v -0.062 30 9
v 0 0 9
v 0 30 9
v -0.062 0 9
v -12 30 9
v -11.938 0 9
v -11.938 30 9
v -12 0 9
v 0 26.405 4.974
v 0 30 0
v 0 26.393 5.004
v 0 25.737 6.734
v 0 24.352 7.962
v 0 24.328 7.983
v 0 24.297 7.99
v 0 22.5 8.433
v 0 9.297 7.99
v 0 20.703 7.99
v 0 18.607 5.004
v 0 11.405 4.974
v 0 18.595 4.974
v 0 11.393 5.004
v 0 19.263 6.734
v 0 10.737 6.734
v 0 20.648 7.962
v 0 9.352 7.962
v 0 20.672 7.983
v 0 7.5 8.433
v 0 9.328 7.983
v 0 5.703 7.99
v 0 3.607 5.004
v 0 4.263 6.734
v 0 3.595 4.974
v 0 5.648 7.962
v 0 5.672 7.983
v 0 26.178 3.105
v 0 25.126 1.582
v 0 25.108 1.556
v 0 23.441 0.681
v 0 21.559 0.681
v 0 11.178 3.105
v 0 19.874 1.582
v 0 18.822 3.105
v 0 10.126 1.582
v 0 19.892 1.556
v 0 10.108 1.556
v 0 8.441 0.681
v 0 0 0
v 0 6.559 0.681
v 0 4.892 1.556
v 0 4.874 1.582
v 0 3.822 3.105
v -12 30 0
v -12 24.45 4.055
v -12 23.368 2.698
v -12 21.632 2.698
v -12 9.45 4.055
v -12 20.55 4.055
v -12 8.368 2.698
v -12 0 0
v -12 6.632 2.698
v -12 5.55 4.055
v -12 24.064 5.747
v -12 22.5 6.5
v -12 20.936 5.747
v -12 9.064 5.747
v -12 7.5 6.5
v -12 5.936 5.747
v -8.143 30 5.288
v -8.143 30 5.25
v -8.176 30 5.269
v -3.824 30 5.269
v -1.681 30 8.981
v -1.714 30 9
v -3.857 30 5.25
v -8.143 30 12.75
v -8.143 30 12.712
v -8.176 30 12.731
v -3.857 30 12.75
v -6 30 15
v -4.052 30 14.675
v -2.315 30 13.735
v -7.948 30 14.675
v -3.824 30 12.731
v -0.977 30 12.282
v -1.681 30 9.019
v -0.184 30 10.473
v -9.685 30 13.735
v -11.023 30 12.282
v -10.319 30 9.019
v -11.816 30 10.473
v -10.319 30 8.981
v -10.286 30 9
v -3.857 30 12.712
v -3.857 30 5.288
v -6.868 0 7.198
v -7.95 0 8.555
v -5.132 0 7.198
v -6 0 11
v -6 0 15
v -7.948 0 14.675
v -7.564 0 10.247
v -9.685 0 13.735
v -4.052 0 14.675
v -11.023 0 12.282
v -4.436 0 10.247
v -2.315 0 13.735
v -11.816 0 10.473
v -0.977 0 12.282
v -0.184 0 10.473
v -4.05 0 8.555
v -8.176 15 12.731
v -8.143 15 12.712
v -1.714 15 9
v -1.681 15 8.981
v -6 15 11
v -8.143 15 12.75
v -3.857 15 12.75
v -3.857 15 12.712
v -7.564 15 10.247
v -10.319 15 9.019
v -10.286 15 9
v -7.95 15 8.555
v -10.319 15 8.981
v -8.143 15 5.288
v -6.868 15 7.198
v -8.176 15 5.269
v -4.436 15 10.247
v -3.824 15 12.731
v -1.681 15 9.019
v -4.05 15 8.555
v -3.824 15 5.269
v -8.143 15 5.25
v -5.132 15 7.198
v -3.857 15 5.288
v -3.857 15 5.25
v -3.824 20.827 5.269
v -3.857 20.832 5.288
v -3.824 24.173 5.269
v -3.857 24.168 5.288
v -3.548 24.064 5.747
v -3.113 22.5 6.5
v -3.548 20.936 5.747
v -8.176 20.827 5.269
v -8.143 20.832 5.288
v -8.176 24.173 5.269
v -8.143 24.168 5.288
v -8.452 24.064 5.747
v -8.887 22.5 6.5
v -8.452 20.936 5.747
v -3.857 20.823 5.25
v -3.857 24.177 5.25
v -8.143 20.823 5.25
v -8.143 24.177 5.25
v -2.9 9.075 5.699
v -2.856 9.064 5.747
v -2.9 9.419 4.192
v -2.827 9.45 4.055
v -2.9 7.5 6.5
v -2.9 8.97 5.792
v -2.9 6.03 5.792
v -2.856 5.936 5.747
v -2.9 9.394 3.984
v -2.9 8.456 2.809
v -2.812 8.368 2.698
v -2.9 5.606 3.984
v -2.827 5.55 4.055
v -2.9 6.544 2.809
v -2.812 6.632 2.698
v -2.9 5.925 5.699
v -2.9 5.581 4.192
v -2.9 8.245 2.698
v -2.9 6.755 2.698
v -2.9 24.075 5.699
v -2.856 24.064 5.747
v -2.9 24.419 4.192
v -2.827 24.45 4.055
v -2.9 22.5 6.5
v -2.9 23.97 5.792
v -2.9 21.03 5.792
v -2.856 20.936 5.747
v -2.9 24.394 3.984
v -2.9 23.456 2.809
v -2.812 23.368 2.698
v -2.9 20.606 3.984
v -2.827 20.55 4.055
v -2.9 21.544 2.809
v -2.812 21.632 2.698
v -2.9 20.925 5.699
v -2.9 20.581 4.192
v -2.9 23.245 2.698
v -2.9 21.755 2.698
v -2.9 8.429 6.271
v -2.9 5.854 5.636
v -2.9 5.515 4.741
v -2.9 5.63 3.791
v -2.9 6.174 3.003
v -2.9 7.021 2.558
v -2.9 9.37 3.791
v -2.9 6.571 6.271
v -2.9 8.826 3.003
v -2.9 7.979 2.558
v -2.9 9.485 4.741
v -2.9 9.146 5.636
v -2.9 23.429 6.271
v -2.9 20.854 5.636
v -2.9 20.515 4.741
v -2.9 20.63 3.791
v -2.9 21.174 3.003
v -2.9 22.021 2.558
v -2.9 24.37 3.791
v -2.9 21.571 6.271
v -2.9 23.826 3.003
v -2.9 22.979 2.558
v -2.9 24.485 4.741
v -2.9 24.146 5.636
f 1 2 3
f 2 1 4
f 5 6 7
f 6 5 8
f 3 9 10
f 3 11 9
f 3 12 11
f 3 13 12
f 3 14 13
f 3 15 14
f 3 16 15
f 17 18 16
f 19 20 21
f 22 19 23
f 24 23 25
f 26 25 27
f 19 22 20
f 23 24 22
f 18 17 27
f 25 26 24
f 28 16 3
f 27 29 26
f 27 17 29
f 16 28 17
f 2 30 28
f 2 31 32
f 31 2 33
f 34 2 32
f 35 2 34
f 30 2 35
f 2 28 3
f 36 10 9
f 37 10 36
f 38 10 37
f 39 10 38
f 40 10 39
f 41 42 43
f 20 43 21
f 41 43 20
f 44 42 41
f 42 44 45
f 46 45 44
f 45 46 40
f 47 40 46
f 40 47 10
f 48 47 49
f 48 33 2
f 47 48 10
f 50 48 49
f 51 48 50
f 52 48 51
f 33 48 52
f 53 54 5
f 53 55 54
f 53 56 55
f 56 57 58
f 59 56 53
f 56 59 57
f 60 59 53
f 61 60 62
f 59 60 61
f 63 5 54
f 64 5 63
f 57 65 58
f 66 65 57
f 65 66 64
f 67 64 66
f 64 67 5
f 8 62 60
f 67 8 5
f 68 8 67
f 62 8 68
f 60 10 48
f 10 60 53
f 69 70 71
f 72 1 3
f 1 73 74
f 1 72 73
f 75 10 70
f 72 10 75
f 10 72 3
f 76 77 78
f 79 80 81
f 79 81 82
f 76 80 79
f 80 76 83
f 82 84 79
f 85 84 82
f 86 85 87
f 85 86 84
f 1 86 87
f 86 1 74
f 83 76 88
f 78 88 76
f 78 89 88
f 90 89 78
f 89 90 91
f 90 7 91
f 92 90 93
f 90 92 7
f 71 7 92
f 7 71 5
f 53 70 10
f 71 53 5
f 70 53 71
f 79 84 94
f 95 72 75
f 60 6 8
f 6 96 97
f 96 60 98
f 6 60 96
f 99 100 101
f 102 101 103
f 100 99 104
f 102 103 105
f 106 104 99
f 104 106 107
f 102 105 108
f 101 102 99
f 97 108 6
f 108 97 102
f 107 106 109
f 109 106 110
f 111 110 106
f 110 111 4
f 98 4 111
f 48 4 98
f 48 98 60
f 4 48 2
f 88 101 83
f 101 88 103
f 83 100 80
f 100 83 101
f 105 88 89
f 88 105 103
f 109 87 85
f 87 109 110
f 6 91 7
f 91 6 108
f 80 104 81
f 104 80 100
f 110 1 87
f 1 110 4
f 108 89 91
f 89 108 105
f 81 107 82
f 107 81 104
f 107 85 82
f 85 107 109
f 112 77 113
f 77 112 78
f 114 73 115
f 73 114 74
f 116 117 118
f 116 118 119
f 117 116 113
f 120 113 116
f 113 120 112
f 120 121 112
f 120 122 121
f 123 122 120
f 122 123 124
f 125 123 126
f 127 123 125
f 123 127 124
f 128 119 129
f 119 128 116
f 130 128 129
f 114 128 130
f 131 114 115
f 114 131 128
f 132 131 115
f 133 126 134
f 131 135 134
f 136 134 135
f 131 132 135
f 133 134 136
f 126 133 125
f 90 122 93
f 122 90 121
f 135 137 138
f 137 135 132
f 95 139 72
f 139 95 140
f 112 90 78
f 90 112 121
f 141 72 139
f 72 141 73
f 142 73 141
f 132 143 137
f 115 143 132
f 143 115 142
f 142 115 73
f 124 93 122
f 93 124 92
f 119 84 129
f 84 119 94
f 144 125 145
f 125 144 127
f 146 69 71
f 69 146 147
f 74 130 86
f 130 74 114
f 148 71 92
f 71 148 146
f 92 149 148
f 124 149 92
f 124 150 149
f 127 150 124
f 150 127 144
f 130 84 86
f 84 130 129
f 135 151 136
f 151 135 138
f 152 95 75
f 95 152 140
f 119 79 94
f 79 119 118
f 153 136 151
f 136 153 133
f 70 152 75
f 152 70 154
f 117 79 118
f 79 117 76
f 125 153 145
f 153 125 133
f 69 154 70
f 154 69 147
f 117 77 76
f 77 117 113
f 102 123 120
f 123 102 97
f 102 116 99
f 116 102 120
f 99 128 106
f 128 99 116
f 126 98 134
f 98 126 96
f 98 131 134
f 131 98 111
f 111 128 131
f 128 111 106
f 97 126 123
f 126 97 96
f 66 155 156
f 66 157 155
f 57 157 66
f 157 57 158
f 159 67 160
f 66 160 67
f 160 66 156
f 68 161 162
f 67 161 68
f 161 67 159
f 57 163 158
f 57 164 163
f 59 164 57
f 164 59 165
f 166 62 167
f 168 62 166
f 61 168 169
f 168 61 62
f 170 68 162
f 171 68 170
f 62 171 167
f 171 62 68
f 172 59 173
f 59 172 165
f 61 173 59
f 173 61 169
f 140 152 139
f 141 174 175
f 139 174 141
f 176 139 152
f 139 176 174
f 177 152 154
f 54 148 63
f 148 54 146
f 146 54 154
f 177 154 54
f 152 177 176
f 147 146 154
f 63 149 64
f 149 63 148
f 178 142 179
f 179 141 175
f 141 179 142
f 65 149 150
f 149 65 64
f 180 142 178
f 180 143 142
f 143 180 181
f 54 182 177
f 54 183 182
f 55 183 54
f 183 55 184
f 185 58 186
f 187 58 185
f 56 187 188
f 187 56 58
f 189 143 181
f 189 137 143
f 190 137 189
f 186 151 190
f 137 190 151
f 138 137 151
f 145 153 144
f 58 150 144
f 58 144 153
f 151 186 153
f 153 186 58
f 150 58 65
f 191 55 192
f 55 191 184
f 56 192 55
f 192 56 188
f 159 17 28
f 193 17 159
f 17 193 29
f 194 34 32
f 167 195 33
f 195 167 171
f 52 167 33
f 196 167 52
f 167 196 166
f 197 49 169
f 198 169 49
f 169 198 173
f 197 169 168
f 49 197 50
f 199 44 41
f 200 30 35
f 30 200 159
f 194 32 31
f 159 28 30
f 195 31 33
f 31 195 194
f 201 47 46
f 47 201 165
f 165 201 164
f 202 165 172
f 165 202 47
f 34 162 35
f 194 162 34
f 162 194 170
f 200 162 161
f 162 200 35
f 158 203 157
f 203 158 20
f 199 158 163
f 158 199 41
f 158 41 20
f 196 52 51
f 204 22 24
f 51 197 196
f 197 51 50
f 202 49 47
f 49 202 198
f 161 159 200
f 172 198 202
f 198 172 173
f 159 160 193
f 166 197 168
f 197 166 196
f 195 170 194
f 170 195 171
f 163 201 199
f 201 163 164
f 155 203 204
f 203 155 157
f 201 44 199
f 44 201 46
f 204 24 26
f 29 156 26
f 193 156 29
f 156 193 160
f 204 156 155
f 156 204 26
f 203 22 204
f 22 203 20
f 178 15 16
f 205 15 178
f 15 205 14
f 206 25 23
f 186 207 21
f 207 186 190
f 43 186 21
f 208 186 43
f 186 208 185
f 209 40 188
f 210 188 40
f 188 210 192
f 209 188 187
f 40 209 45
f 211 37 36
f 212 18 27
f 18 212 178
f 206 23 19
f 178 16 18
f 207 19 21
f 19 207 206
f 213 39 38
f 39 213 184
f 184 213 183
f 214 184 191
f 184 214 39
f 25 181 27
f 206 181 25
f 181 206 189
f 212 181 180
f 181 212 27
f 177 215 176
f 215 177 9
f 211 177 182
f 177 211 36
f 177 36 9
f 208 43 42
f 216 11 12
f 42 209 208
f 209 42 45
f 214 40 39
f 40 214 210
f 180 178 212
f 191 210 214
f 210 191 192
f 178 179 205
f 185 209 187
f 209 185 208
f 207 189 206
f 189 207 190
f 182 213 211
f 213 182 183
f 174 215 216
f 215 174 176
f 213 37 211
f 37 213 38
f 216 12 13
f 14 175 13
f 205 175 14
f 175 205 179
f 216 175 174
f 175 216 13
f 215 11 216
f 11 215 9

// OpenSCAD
wood_thickness = 9;  // base for sizes is the wood thickness

hinge_depth = 30;  // actually the length of the body
hinge_height = wood_thickness * 1.0;  // * 1.0 for just folding or * 1.5 for folding over 
hinge_width = 12;  // thickness
penis_dia = 7;
penis_length = 5;
penis_clearance = 0.4;  // Try this out, see if it fits. 

hole_from_side = hinge_depth / 4;
hole_from_bottom = wood_thickness / 2;
hole_dia = 4;
hole_dia_outer = 8;
hole_distance_to_outer = 3;  // distance from outer to narrow part

left_or_right = 1;  // 0 for tapped hole on one side, 1 for other side
single = 1;

pin_hexagon_size = 7.5;  // moerkop grootte
pin_head_length = hinge_depth; //hinge_depth / 3;  // Ruimte voor moerkop  
pin_length = hinge_depth / 2;  // Hoe lang is de pin in het plastic
pin_dia = 4;

// size is the XY plane size, height in Z
module hexagon(size, height) {
  boxWidth = size/1.75;
  for (r = [-60, 0, 60]) rotate([0,0,r]) cube([boxWidth, size, height], true);
}


module hinge_body() {
	cube([hinge_height, hinge_depth, hinge_width]);

	translate([hinge_height, 0, hinge_width/2])
	rotate(a=-90, v=[1,0,0])
	cylinder(hinge_depth, hinge_width/2, hinge_width/2, [0,0,0]);
}


module hinge() {
rotate([0, -90, 0]) 
difference() {
	hinge_body();

	// Pin head
	translate([hinge_height, pin_head_length/2 + pin_length, hinge_width/2])
	rotate(a=-90, v=[1,0,0])
	rotate(a=30, v=[0,0,1])
	hexagon(pin_hexagon_size, pin_head_length);

	// Open up
	//translate([hinge_height,pin_length,-1])
	//cube([hinge_height+2, hinge_depth, hinge_width+2]);

	// The actual pin
	translate([hinge_height, -1, hinge_width/2])
	rotate([-90,0,0])
	cylinder(r=pin_dia/2, h=pin_length+2);

	// Screw holes
	translate([hole_from_bottom, hole_from_side, -1])
	cylinder(r=hole_dia/2, h=hinge_depth+2);

	translate([hole_from_bottom, hinge_depth - hole_from_side, -1])
	cylinder(r=hole_dia/2, h=hinge_depth+2);

	// Make screw holes tapped
	translate([hole_from_bottom, hole_from_side, hinge_width-hole_distance_to_outer+0.1])
	cylinder(hole_distance_to_outer, hole_dia/2, hole_dia_outer/2);
	translate([hole_from_bottom, hinge_depth - hole_from_side, hinge_width-hole_distance_to_outer+0.1])
	cylinder(hole_distance_to_outer, hole_dia/2, hole_dia_outer/2);
}
}

if (left_or_right == 0) {
  hinge();

if (single == 0) {
translate([2*hinge_width,0,0])
  hinge();
}

} else {

translate([-hinge_width,0,0])
mirror([ 1, 0, 0 ]) {hinge(); }

if (single == 0) {
translate([hinge_width,0,0])
mirror([ 1, 0, 0 ]) {hinge(); }
}

}
